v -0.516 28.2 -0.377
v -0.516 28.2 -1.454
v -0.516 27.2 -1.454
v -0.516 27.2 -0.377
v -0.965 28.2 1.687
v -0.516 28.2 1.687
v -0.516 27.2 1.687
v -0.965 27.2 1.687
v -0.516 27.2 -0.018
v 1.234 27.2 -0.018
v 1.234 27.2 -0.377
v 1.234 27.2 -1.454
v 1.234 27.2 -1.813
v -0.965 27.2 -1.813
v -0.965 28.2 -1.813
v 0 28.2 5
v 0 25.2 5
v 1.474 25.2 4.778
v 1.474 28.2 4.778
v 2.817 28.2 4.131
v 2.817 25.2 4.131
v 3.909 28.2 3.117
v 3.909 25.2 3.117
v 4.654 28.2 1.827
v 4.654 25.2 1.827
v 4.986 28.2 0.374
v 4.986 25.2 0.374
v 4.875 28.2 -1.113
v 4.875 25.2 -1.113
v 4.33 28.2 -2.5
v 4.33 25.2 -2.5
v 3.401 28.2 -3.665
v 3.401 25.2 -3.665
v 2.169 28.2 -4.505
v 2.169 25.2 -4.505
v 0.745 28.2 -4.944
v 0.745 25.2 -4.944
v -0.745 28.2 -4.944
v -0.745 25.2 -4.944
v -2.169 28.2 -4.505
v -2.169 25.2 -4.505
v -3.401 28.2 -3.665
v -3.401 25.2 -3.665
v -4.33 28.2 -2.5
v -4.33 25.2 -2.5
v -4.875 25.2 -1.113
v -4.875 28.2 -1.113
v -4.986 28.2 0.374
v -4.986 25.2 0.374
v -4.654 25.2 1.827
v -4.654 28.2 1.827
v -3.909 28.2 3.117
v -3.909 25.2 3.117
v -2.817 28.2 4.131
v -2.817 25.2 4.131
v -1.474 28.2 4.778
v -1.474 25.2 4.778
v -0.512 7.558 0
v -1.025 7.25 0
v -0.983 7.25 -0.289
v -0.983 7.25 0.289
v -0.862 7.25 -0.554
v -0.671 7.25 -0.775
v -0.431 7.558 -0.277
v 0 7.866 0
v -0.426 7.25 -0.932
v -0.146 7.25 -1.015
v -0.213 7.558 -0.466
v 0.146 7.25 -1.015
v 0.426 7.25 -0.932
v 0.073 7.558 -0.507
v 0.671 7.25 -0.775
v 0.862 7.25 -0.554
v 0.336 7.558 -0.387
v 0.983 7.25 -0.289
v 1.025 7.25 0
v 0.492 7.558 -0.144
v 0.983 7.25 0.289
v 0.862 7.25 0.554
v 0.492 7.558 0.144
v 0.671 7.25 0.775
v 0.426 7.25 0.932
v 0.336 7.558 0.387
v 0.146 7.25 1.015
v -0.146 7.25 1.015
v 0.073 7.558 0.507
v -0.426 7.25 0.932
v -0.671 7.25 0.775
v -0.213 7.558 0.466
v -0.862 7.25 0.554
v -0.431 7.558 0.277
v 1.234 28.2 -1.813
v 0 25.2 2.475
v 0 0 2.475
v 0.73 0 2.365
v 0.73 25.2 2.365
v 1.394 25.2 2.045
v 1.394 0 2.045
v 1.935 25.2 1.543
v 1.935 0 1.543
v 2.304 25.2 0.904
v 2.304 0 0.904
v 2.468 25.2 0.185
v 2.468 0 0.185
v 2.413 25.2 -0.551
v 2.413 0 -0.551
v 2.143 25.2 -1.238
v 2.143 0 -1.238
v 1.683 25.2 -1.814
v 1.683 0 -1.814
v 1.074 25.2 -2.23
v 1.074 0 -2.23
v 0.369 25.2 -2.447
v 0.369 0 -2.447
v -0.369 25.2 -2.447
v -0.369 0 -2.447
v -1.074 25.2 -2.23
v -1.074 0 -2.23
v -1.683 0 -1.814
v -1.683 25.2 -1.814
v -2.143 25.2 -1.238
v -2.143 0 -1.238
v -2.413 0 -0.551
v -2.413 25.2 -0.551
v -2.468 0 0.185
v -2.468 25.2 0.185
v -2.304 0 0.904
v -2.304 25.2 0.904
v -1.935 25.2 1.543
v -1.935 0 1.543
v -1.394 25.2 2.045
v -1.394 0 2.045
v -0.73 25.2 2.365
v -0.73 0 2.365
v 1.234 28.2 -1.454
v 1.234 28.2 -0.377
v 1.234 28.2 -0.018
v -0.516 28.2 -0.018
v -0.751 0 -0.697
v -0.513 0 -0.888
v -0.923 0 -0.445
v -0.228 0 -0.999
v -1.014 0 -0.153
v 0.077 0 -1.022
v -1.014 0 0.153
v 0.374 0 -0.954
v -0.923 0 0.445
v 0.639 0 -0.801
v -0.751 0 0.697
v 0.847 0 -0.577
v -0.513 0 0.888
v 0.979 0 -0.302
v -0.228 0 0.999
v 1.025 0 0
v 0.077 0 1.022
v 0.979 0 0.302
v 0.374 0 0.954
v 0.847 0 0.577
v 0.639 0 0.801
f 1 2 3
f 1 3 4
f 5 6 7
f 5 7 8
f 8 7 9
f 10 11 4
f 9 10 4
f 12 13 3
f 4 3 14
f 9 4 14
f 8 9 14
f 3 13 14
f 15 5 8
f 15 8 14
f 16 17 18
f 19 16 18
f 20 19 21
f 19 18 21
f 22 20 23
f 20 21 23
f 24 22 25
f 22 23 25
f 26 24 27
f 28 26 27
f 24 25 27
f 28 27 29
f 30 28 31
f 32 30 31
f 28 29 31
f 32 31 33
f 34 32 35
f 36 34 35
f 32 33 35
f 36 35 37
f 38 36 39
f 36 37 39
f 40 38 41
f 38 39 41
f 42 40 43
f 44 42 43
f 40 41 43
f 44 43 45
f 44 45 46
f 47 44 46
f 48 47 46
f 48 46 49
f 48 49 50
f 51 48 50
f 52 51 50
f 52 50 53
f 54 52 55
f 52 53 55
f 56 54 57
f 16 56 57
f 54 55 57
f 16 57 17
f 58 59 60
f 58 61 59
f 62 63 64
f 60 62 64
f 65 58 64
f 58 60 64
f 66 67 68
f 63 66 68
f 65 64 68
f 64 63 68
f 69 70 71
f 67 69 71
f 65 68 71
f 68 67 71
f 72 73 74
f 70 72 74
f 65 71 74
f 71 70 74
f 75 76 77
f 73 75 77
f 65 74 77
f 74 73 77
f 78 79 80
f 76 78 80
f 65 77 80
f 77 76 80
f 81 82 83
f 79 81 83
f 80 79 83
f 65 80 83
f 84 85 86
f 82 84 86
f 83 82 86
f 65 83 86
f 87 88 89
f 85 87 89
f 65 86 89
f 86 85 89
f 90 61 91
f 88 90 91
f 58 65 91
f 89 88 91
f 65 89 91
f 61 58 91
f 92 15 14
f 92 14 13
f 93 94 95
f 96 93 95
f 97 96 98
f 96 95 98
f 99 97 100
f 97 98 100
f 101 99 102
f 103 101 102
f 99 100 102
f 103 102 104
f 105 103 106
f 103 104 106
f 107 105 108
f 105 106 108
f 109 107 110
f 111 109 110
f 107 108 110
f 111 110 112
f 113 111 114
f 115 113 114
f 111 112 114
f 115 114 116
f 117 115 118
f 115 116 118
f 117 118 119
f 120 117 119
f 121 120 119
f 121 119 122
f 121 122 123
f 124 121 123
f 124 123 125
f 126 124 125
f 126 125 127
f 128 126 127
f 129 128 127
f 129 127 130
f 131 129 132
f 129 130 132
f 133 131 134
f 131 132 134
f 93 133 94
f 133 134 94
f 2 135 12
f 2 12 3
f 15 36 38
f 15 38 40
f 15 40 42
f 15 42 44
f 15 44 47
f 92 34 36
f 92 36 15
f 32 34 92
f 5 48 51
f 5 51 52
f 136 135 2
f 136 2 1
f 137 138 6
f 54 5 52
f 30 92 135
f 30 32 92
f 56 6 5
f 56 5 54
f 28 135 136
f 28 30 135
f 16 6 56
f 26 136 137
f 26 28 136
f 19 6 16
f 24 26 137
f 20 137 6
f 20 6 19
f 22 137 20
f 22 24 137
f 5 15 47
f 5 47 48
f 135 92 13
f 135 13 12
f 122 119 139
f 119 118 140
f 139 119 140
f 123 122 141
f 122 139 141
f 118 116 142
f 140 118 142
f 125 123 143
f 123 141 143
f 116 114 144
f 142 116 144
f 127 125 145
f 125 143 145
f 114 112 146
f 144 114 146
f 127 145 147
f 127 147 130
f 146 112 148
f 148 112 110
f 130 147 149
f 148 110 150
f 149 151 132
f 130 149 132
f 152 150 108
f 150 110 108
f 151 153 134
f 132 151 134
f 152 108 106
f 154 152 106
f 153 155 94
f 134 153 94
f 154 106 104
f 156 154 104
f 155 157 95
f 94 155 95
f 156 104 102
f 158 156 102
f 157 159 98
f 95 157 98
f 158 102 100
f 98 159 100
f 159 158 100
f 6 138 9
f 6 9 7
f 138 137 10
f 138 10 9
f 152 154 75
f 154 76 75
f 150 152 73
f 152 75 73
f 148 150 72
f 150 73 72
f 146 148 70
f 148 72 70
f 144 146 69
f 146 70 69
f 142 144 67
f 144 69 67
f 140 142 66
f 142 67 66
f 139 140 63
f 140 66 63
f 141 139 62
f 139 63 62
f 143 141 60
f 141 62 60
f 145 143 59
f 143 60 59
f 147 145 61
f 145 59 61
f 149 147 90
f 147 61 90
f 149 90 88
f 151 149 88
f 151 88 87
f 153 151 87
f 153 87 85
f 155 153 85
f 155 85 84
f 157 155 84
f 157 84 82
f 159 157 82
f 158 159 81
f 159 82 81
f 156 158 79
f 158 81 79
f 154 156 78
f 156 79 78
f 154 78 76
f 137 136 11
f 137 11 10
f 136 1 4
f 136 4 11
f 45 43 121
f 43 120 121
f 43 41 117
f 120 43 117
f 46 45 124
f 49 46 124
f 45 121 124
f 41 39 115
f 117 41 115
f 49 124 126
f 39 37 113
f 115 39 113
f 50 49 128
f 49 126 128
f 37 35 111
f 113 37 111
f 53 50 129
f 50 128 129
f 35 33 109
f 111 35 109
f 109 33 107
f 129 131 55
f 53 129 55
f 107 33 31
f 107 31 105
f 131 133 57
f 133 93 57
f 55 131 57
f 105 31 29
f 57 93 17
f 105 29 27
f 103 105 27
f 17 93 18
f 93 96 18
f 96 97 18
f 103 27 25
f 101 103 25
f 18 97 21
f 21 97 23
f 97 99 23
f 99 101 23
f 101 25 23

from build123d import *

# Parameters (mm, degrees)
SKETCH1_R                    = 2.475
BOSS_EXTRUDE1_DEPTH          = 25.2
SKETCH2_R                    = 5
BOSS_EXTRUDE2_DEPTH          = 3
M2_5X0_45_TAPPED_HOLE2_D     = 2.05
M2_5X0_45_TAPPED_HOLE2_DEPTH = 7.25
M2_5X0_45_TAPPED_HOLE2_TIP   = 0.615882135
CUT_EXTRUDE1_DEPTH           = 1


with BuildPart() as part:
    # Sketch1 → Boss-Extrude1 (new body)
    with BuildSketch(Plane(origin=(0, 0, 0), x_dir=(1, 0, 0), z_dir=(0, 1, 0))):
        with Locations(Location((0, 0, 0), (0, 0, 270))):
            Circle(SKETCH1_R)
    extrude(amount=BOSS_EXTRUDE1_DEPTH)

    # Sketch2 → Boss-Extrude2 (add)
    with BuildSketch(Plane(origin=(0, 25.2, 0), x_dir=(1, 0, 0), z_dir=(0, 1, 0))):
        with Locations(Location((0, 0, 0), (0, 0, 270))):
            Circle(SKETCH2_R)
    extrude(amount=BOSS_EXTRUDE2_DEPTH)

    # M2.5x0.45 Tapped Hole2
    with Locations(Plane(origin=(0, 0, 0), x_dir=(-1, 0, 0), z_dir=(0, -1, 0))):
        with Locations((0, 0)):
            Hole(M2_5X0_45_TAPPED_HOLE2_D / 2, depth=M2_5X0_45_TAPPED_HOLE2_DEPTH)
            with Locations((0, 0, -(M2_5X0_45_TAPPED_HOLE2_DEPTH + M2_5X0_45_TAPPED_HOLE2_TIP / 2))):  # 118° drill point
                Cone(0, M2_5X0_45_TAPPED_HOLE2_D / 2, M2_5X0_45_TAPPED_HOLE2_TIP, mode=Mode.SUBTRACT)

    # Sketch15 → Cut-Extrude1 (cut)
    with BuildSketch(Plane(origin=(0, 28.2, 0), x_dir=(1, 0, 0), z_dir=(0, 1, 0))):
        Polygon((-0.96474359, 1.812951114), (1.233974359, 1.812951114), (1.233974359, 1.453976755), (-0.516025641, 1.453976755), (-0.516025641, 0.377053678), (1.233974359, 0.377053678), (1.233974359, 0.018079319), (-0.516025641, 0.018079319), (-0.516025641, -1.687048886), (-0.96474359, -1.687048886), align=None)
    extrude(amount=-CUT_EXTRUDE1_DEPTH, mode=Mode.SUBTRACT)


solid = part.part
